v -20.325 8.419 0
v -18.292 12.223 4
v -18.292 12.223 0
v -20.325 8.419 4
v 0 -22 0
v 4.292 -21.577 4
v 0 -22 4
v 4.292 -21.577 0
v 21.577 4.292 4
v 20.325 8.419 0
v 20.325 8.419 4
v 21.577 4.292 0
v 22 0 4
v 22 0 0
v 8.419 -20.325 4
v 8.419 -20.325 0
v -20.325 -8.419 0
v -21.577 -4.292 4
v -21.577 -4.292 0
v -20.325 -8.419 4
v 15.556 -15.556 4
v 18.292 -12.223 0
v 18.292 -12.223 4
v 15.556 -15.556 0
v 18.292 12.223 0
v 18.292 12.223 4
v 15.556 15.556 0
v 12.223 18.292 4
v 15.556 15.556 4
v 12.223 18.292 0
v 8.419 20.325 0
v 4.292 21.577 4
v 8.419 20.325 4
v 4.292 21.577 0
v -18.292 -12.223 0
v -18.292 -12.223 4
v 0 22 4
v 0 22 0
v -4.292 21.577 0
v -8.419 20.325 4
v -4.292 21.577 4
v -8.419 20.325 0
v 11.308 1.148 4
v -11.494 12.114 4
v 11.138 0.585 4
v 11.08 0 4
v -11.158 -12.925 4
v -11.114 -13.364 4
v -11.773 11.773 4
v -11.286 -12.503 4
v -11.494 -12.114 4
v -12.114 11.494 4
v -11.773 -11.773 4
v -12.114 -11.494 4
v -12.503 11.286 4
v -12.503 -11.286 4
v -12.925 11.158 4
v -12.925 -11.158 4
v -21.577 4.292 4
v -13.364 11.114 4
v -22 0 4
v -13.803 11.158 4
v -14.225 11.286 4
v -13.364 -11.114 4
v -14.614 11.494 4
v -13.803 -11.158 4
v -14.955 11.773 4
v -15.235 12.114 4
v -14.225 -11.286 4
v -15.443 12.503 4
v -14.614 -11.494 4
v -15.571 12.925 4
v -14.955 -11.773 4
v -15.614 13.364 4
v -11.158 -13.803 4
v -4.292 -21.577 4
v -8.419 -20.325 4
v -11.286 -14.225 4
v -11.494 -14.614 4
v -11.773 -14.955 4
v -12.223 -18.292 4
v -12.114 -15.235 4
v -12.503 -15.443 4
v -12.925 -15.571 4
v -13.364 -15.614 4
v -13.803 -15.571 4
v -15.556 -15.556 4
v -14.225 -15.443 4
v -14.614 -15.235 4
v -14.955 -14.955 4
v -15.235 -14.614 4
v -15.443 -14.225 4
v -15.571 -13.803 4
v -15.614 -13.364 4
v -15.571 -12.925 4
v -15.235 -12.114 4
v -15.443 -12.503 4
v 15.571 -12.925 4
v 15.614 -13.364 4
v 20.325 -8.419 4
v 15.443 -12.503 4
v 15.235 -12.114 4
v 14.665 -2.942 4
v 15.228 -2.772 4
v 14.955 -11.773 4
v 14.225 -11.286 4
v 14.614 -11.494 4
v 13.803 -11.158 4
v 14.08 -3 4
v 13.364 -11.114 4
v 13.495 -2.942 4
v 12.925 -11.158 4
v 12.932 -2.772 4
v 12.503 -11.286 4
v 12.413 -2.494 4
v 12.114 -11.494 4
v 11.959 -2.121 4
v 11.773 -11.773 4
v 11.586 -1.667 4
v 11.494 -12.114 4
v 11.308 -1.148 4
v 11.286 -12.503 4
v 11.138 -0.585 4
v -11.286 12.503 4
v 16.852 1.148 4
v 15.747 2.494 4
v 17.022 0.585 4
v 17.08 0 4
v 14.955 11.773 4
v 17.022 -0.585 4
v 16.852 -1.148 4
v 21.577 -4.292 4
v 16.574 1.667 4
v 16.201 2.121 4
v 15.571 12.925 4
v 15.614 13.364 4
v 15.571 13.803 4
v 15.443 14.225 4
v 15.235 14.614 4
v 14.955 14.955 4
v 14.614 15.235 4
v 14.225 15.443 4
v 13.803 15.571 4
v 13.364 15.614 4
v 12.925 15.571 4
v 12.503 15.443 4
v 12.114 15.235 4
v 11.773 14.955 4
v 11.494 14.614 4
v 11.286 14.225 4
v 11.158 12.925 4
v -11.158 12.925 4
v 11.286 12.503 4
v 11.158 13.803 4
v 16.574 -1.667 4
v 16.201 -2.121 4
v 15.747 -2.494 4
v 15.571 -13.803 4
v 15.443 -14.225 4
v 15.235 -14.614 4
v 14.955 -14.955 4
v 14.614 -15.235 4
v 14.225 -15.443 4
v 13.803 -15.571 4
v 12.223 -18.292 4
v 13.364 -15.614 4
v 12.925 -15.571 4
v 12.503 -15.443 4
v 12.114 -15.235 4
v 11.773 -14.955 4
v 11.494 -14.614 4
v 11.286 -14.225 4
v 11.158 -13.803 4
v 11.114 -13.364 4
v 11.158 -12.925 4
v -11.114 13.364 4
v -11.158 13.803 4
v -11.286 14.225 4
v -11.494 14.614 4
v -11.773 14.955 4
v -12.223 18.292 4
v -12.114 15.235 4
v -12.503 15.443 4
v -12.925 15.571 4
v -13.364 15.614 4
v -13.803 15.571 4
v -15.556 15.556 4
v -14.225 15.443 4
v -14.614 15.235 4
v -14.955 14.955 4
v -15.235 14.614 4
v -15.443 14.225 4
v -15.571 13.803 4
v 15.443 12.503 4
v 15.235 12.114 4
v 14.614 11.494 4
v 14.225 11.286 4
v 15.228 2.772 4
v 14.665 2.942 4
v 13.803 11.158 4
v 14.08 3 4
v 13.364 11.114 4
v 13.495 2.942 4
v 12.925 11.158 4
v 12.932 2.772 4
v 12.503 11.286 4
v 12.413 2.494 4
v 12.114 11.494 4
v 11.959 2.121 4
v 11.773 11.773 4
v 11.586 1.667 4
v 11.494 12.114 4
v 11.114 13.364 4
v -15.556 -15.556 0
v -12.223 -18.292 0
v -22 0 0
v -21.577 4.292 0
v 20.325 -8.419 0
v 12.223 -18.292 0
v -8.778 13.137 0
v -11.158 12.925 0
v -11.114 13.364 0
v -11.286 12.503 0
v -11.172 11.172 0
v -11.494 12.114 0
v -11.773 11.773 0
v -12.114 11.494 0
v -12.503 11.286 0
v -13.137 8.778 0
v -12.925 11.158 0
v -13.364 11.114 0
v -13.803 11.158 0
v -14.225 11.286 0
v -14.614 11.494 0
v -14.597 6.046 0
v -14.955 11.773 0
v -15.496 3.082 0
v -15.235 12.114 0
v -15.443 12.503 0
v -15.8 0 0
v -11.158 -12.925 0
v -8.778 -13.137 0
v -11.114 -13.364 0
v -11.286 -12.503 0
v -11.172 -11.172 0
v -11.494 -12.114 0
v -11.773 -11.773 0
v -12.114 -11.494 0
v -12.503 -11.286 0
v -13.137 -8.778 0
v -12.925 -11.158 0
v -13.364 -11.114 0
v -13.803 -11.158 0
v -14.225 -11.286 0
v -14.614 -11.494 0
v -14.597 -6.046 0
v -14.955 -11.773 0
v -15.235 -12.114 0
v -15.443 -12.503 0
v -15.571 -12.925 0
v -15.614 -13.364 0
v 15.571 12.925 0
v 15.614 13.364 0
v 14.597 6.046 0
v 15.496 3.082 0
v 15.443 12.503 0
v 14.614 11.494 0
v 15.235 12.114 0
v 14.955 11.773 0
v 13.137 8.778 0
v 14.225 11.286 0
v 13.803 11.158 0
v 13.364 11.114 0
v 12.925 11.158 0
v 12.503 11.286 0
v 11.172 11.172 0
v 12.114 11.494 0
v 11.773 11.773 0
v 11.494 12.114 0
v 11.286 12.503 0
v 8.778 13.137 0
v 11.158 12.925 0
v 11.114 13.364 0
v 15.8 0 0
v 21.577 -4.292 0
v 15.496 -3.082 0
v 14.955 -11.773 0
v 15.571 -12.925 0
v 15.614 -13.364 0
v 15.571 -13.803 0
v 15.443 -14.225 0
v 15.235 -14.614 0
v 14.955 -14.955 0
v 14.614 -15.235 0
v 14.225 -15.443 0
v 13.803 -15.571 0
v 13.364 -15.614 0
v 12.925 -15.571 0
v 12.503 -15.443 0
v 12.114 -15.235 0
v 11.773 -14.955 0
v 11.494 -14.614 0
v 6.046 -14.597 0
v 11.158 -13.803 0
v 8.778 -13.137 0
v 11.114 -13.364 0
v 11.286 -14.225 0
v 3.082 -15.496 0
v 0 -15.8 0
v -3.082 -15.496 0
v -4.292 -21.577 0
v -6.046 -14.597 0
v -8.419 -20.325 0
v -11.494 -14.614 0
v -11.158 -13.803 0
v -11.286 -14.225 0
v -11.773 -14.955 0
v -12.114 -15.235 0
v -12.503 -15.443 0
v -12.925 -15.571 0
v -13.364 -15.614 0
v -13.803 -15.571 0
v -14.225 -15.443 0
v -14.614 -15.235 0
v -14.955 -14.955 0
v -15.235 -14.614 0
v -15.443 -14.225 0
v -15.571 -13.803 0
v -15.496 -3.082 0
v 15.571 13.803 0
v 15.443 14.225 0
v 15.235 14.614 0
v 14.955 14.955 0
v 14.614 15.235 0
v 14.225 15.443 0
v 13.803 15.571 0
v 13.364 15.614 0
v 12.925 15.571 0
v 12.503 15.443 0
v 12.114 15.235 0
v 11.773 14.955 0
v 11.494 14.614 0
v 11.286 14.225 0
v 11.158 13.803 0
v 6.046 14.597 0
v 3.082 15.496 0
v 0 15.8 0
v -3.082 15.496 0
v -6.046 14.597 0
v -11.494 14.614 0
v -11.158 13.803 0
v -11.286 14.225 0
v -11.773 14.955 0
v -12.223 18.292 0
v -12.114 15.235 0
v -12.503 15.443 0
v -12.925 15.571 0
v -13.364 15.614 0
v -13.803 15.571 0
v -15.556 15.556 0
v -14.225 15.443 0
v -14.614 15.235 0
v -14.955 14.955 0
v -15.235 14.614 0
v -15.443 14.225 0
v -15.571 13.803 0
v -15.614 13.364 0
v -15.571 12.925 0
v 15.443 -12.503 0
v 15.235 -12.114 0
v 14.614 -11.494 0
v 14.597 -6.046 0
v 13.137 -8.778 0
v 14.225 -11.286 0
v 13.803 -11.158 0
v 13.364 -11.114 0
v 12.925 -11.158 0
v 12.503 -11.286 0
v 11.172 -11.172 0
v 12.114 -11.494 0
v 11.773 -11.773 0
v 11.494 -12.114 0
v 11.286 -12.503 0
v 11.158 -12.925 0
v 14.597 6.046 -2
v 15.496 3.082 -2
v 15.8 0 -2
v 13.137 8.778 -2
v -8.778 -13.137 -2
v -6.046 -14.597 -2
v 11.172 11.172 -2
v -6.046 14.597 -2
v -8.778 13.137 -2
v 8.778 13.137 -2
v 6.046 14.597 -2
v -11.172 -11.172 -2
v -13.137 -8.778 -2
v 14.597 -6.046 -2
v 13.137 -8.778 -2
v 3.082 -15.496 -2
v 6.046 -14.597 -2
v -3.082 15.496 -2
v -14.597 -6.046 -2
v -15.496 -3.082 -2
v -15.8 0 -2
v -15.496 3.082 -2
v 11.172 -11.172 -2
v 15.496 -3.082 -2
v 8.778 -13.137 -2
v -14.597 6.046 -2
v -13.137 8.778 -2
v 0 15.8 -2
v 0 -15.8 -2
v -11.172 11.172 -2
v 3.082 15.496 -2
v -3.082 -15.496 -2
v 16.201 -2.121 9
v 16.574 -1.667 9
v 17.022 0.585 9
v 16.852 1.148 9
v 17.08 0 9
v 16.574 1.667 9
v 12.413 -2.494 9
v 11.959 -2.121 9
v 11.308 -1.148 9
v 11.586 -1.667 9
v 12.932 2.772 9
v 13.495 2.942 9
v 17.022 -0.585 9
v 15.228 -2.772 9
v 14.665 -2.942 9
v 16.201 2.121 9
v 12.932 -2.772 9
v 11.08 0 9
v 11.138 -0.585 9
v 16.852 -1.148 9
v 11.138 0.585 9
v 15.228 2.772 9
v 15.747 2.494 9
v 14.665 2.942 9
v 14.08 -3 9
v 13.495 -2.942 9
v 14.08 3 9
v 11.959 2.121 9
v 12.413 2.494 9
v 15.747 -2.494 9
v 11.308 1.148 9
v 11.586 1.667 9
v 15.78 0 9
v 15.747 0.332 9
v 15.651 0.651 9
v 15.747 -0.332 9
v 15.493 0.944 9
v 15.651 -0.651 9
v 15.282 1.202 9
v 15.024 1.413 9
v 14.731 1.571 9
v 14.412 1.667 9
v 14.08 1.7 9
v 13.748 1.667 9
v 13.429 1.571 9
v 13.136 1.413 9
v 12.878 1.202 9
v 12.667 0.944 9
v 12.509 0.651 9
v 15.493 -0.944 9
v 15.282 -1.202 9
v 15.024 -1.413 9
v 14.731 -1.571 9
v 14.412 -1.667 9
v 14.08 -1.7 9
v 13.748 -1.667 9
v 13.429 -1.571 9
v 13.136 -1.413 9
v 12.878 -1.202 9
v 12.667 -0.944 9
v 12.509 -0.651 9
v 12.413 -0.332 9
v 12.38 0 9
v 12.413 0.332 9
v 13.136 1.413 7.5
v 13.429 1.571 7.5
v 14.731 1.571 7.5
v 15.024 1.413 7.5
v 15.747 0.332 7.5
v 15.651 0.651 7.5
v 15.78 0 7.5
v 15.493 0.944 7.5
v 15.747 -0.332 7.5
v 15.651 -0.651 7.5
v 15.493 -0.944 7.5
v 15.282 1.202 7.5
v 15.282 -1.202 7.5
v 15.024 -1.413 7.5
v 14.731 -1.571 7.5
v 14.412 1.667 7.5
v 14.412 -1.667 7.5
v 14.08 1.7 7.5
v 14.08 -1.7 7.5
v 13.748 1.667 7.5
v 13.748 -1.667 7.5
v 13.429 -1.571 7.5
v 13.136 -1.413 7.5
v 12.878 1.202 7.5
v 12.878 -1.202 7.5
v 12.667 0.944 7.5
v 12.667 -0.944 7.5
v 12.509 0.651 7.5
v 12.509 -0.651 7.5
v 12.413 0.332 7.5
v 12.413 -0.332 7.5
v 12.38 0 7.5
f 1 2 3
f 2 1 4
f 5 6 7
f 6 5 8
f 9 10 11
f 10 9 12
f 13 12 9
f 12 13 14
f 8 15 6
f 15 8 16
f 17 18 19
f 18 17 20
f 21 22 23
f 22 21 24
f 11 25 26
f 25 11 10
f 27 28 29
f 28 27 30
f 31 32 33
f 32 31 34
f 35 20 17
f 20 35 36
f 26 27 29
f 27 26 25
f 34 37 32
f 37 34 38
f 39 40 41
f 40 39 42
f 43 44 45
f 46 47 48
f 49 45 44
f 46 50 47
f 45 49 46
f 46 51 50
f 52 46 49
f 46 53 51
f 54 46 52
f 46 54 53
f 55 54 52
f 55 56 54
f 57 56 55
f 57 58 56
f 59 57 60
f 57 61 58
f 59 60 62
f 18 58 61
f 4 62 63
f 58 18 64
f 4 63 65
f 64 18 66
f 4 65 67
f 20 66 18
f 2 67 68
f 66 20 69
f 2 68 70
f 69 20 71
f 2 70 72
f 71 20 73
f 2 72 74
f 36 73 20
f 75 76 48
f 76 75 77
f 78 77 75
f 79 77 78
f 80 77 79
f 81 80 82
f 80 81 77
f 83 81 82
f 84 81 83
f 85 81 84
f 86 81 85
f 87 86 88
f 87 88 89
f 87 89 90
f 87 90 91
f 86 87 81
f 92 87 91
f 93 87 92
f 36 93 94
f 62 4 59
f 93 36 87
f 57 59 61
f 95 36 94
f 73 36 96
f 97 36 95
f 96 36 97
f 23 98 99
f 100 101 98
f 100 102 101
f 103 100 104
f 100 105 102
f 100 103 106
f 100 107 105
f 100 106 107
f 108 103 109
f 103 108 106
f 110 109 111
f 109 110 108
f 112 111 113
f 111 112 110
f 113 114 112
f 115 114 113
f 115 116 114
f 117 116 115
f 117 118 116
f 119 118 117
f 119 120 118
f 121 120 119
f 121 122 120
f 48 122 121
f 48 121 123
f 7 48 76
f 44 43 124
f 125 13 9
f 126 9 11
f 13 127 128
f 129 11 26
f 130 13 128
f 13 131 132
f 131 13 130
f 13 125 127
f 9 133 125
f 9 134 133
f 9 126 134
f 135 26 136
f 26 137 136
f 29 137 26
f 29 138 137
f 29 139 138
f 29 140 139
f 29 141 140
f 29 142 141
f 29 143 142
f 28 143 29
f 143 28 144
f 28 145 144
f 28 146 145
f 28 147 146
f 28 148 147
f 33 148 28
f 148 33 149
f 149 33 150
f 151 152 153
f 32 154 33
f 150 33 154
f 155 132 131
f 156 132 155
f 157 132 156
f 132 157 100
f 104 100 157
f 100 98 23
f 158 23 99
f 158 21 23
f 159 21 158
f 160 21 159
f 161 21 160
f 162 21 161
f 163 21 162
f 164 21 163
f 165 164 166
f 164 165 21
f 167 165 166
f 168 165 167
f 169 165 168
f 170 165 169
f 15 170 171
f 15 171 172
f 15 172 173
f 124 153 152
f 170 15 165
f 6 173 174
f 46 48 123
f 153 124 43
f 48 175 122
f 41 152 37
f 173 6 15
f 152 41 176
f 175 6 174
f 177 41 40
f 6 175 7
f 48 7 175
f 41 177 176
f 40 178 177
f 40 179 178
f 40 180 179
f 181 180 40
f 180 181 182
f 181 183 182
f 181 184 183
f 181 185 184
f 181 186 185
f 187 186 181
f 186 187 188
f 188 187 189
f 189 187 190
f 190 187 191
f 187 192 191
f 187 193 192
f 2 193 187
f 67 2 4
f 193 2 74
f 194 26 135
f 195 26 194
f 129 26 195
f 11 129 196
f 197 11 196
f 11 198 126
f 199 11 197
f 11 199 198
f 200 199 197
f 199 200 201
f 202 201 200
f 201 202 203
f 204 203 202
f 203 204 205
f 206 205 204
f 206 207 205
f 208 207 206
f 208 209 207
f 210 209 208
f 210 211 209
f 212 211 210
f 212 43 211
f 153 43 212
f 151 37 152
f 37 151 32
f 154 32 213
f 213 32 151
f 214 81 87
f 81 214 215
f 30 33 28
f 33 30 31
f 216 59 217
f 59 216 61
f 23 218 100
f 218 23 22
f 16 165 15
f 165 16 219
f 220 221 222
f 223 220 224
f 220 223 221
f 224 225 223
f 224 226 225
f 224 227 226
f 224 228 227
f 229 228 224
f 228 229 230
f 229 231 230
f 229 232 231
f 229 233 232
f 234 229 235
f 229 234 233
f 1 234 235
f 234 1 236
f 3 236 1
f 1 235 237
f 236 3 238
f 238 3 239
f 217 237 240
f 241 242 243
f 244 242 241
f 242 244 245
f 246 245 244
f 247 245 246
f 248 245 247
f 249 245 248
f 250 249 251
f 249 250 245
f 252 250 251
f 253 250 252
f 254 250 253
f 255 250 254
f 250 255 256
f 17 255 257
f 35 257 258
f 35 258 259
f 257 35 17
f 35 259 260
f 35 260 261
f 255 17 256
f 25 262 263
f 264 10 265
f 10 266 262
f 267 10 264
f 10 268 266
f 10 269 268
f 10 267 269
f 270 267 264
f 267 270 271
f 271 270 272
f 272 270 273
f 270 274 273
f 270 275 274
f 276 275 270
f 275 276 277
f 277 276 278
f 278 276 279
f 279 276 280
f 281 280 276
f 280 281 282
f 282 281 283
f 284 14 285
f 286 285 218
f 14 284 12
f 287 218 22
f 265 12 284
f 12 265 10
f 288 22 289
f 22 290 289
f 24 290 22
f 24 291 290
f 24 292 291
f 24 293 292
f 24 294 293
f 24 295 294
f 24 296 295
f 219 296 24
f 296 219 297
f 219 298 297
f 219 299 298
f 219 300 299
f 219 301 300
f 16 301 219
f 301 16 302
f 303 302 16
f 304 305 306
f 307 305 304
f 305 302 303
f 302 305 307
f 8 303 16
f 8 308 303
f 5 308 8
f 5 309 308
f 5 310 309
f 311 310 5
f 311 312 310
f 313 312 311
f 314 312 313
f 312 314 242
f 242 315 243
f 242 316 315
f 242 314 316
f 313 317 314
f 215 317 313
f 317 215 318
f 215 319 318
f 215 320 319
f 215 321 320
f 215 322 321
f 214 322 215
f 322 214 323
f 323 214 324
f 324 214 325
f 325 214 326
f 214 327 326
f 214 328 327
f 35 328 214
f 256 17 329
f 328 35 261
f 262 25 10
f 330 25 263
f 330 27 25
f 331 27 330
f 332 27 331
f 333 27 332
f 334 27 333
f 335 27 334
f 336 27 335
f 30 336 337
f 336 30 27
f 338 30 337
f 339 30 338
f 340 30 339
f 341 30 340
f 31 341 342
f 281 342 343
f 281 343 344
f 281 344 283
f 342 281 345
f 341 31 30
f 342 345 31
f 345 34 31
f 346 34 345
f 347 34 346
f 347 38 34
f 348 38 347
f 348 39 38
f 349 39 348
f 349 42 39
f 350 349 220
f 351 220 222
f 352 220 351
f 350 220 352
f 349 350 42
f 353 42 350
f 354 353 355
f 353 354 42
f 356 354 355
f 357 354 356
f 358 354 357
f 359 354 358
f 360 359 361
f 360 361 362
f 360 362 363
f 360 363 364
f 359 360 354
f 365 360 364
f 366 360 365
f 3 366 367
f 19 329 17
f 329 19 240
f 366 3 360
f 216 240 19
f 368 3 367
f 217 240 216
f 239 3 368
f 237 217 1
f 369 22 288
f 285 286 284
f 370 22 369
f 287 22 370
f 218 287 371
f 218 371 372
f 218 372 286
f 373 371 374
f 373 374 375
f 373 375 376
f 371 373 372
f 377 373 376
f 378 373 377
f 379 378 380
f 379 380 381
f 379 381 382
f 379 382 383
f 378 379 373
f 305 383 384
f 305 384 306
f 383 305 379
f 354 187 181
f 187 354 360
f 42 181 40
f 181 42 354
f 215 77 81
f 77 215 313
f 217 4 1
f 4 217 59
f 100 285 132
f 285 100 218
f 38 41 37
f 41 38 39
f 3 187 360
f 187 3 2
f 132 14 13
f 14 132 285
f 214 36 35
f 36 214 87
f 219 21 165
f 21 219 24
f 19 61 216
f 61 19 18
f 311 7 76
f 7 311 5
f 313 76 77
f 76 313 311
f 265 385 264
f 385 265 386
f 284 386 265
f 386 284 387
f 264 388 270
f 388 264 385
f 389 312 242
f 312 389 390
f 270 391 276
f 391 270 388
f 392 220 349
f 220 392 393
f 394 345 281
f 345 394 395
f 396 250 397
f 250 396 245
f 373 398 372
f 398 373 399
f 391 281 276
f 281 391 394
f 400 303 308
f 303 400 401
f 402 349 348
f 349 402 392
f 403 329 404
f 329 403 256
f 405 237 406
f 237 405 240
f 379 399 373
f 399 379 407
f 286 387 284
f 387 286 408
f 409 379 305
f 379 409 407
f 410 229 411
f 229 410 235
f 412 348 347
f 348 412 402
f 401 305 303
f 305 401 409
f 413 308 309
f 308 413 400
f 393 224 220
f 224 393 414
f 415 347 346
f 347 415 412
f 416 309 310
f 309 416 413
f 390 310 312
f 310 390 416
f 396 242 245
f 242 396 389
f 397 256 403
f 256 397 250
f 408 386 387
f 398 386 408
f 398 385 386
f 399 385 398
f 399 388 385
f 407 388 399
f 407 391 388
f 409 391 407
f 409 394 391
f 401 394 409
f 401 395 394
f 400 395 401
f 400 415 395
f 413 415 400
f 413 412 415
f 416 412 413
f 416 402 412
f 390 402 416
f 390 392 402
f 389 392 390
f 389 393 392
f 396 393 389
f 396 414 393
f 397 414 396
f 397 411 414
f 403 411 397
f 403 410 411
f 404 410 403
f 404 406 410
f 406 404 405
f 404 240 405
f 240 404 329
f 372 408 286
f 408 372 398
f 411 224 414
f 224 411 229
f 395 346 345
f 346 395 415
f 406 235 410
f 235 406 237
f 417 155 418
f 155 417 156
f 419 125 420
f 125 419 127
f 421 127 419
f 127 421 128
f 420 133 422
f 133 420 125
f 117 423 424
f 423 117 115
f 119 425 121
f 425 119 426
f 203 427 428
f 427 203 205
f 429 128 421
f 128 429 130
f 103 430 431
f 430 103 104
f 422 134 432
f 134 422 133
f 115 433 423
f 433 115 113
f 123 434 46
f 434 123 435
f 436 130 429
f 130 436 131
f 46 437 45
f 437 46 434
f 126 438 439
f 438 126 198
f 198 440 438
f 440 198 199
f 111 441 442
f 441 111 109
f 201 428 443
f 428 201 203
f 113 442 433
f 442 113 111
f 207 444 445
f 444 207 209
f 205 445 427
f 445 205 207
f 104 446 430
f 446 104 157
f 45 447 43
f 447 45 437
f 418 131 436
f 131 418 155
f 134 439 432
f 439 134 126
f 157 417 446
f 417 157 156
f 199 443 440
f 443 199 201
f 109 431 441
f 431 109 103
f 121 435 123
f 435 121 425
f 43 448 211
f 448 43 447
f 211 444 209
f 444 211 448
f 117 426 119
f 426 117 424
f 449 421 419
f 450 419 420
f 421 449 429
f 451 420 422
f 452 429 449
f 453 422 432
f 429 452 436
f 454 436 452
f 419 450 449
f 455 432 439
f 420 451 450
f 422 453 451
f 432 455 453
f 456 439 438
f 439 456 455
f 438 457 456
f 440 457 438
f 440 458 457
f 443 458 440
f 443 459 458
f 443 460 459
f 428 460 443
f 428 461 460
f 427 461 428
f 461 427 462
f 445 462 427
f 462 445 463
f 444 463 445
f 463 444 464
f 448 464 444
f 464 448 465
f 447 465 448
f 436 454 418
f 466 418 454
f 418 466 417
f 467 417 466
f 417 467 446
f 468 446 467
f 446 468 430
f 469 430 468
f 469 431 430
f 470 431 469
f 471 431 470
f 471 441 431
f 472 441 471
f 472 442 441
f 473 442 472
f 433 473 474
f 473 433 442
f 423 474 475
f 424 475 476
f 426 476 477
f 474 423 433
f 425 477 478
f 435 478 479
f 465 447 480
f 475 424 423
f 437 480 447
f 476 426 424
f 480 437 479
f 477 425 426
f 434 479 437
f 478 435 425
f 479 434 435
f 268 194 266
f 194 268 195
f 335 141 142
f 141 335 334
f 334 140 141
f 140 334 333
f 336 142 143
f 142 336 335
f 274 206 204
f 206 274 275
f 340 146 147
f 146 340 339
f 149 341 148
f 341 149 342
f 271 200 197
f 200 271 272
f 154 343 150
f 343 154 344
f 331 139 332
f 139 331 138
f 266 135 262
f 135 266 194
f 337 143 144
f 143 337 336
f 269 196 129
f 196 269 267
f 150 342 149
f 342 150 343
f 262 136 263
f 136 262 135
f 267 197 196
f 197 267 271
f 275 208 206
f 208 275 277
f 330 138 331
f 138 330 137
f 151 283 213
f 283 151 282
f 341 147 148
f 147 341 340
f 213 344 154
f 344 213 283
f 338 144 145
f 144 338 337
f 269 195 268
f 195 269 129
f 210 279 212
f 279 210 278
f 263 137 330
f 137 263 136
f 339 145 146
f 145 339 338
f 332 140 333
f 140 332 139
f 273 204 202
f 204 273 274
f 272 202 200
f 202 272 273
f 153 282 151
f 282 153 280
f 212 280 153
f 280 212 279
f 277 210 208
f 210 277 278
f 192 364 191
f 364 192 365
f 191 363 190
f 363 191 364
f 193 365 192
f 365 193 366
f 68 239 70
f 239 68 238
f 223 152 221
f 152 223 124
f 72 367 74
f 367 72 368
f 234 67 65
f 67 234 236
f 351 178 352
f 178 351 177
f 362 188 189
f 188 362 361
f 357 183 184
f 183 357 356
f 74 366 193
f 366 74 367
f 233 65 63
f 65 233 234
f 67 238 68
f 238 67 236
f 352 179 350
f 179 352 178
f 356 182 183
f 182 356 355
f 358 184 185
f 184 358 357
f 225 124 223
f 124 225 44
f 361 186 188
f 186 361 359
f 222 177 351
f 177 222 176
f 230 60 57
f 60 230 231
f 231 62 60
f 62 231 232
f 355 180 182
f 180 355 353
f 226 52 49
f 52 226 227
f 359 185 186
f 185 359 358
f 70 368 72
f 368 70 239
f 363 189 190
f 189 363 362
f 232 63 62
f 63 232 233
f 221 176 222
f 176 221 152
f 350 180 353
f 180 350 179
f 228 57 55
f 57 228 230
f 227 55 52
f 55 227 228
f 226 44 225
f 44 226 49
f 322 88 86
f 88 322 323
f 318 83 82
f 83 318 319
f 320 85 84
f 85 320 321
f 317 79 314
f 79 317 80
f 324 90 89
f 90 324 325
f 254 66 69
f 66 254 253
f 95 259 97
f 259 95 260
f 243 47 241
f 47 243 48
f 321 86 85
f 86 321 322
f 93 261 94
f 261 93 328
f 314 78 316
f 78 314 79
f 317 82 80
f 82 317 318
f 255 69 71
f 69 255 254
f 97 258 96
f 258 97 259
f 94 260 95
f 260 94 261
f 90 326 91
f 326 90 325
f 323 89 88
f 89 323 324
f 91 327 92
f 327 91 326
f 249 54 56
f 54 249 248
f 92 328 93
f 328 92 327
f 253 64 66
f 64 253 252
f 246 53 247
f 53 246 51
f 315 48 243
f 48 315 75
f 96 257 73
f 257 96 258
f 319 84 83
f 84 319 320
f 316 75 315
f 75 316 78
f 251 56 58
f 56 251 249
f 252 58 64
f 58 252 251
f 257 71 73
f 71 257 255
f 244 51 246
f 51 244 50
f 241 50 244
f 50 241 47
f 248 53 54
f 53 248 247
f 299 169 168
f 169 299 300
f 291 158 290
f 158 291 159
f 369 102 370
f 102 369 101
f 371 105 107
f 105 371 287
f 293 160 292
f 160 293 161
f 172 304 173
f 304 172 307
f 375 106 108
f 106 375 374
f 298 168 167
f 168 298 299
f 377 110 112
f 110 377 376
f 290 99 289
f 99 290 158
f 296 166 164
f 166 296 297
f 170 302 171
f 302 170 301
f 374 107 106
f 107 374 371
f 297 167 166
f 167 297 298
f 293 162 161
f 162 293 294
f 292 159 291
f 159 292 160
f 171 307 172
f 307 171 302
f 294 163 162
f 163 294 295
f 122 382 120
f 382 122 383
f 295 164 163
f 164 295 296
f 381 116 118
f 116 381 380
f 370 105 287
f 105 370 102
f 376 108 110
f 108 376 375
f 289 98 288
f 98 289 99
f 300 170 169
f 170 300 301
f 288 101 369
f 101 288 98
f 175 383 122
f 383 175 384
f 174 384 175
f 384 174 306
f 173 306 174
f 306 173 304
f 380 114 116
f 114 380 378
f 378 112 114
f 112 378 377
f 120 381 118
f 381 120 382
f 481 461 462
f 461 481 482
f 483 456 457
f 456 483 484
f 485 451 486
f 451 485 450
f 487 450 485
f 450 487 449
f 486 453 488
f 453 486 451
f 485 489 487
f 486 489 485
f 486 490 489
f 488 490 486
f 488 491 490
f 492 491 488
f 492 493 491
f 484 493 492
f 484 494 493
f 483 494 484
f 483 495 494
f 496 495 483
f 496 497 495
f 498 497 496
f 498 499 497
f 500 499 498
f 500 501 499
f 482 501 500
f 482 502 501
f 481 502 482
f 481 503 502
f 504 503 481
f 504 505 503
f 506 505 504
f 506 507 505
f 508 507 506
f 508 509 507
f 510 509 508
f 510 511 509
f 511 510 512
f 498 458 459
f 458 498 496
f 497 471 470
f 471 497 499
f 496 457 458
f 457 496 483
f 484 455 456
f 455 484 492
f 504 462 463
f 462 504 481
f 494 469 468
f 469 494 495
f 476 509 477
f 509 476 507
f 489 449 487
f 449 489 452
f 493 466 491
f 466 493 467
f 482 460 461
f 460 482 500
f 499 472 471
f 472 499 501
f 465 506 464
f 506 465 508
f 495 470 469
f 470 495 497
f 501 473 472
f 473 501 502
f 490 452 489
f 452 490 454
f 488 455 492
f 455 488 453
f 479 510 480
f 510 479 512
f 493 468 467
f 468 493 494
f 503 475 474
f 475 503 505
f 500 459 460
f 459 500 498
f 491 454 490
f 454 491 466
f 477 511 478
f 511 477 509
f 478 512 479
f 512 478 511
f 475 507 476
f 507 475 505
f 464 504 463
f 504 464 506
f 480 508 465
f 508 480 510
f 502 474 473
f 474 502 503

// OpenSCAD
$fn = 32;

// ----------------------------------------------------------------------
// Retaining cap: 6002 cover, 44 mm, spigot 31.6 mm
// ----------------------------------------------------------------------

// --- parameters (mm) ---
plate_d = 44;             // cover diameter
plate_t = 4;              // cover thickness
boss_d = 31.6;            // spigot that enters the housing
boss_h = 2;               // spigot height
bolt_d = 4.5;             // bolt clearance
bolt_r = 18.9;            // bolt circle radius
nipple_d = 6;             // grease nipple boss
nipple_h = 5;             // grease nipple boss height

module cover() {
  cylinder(h = plate_t, d = plate_d);
}

module spigot() {
  /* sunk 1 mm into the cover; the spigot sets the overall height */
  translate([0, 0, -boss_h]) cylinder(h = boss_h + 1, d = boss_d);
}

module nipple() {
  translate([plate_d * 0.32, 0, plate_t - 1])
    cylinder(h = nipple_h + 1, d = nipple_d);
}

difference() {
  union() {
    cover();
    spigot();
    nipple();
  }
  for (i = [0 : 3]) rotate([0, 0, 45 + i * 90]) translate([bolt_r, 0, -boss_h - 1])
    cylinder(h = boss_h + plate_t + 2, d = bolt_d);
  translate([plate_d * 0.32, 0, plate_t + nipple_h - 1.5]) cylinder(h = 4, d = 3.4);
}
